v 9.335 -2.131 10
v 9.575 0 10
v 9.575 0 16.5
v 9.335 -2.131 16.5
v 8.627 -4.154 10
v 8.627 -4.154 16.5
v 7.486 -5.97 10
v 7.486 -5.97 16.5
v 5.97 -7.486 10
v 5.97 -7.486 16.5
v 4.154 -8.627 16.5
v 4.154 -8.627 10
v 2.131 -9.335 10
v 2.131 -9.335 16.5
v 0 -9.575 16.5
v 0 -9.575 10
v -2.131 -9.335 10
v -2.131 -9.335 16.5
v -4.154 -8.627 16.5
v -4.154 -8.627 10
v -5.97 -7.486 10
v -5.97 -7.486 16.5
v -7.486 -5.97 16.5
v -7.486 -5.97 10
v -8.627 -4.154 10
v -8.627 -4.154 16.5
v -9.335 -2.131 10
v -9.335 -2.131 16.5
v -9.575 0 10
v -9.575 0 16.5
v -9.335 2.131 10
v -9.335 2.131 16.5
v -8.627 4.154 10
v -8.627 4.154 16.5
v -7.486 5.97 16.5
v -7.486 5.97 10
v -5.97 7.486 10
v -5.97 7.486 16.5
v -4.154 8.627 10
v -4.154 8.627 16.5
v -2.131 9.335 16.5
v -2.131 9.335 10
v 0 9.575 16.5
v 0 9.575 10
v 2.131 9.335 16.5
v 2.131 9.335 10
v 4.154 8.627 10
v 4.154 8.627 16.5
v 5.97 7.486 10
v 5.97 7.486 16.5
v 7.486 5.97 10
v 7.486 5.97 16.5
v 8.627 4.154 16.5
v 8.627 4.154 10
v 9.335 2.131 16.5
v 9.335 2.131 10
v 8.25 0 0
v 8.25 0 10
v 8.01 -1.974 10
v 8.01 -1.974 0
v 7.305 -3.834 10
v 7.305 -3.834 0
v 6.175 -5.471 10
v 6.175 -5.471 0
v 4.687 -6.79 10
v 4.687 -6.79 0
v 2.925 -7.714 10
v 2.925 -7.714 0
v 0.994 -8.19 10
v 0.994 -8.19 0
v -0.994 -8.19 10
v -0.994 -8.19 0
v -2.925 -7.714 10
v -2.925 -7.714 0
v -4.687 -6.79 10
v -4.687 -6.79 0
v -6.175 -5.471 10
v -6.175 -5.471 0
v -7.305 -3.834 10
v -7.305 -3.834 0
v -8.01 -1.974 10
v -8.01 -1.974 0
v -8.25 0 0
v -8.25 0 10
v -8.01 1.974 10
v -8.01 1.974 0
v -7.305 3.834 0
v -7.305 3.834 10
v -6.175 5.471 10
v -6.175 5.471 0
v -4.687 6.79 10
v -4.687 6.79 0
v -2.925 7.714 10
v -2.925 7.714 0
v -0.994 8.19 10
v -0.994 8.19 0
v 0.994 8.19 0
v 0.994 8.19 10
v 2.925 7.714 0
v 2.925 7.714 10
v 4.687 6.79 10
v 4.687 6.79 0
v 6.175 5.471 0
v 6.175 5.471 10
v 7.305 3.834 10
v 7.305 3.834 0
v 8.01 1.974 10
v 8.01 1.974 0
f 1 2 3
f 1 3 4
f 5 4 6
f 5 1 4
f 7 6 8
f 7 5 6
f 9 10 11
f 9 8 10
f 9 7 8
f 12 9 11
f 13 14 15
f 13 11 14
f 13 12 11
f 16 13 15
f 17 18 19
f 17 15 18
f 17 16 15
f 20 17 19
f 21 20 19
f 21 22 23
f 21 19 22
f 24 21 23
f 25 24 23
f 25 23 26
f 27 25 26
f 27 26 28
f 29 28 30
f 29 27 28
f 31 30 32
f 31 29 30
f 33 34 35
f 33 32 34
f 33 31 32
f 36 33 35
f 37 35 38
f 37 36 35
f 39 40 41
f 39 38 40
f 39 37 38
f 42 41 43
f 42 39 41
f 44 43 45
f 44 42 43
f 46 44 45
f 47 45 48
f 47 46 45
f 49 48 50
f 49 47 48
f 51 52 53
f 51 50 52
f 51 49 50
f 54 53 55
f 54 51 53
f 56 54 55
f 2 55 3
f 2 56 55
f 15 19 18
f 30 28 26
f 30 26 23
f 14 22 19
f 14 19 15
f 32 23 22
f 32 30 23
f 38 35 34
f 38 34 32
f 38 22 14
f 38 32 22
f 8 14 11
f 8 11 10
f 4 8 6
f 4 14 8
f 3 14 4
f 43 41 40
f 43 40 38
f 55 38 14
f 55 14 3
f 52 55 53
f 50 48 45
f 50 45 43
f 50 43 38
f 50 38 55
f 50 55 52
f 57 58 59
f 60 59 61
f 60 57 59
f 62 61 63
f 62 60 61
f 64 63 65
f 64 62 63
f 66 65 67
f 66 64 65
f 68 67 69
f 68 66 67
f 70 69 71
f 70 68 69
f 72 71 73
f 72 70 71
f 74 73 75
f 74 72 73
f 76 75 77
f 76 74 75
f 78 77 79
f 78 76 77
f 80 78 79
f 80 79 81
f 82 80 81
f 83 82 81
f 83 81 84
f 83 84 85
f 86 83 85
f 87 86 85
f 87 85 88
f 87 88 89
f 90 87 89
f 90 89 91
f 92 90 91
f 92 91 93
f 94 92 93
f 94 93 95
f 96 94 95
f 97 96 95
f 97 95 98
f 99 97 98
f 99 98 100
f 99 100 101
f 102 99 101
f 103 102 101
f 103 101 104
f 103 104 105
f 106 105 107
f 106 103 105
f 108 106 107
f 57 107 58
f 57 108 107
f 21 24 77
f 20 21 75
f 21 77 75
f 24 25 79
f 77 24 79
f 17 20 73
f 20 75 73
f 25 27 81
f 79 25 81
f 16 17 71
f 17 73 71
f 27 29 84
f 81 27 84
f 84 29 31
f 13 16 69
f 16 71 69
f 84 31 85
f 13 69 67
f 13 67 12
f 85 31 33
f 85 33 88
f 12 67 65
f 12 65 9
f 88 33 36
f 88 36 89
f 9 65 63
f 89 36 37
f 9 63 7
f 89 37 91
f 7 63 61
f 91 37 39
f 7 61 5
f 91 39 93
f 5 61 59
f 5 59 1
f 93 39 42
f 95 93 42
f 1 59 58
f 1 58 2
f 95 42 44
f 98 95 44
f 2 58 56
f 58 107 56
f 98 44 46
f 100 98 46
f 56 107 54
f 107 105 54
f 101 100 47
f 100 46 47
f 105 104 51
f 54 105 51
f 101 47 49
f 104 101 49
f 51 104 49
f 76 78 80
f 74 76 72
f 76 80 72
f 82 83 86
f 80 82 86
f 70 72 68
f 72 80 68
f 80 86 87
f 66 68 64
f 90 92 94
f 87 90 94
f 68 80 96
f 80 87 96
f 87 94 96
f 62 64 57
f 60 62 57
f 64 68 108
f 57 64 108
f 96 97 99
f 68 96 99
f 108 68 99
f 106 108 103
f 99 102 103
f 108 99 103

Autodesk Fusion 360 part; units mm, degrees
sketch "Sketch1" plane through (0, 0, 0) normal (0, 0, 1) x (1, 0, 0)
  circle A0 centre (0, 0) radius 6.15
  dimension "d1" = 12.3
ref_plane "WorkPlane1" through (0, 0, 10) normal (0, 0, 1) x (1, 0, 0)
sketch "Sketch2" plane through (0, 0, 10) normal (0, 0, 1) x (1, 0, 0)
  circle A0 centre (0, 0) radius 7.75
  dimension "d3" = 15.5
loft "Loft1" add profiles "Sketch2", "Sketch1" section 1 section 2
sketch "Sketch3" plane through (0, 0, 10) normal (0, 0, 1) x (1, 0, 0)
  circle A0 centre (0, 0) radius 7.75
  circle A1 centre (0, 0) radius 9.575
  dimension "d4" = 19.15
extrude "Extrude1" add sketch "Sketch3" along normal blind 6.5 contours A0 | A1
sketch "Sketch4" plane through (0, 0, 16.5) normal (0, 0, 1) x (1, 0, 0)
  circle A0 centre (0, 0) radius 9.575
  circle A1 centre (0, 0) radius 5.25 construction
  line L0 (0, 5.25) -> (0, -5.25) construction
  circle A2 centre (0, 5.25) radius 0.5
  circle A3 centre (-3.7123, 3.7123) radius 0.5
  circle A4 centre (-3.7123, -3.7123) radius 0.5
  circle A5 centre (0, -5.25) radius 0.5
  circle A6 centre (3.7123, -3.7123) radius 0.5
  circle A7 centre (3.7123, 3.7123) radius 0.5
  dimension "d7" = 10.5
  dimension "d8" = 1
  dimension "d10" = 360

Autodesk Fusion 360 part; units mm, degrees
sketch "Sketch1" plane through (0, 0, 0) normal (0, 0, 1) x (1, 0, 0)
  circle A0 centre (0, 0) radius 8.25
  dimension "d1" = 16.5
extrude "Extrude1" add sketch "Sketch1" along normal blind 11.5
